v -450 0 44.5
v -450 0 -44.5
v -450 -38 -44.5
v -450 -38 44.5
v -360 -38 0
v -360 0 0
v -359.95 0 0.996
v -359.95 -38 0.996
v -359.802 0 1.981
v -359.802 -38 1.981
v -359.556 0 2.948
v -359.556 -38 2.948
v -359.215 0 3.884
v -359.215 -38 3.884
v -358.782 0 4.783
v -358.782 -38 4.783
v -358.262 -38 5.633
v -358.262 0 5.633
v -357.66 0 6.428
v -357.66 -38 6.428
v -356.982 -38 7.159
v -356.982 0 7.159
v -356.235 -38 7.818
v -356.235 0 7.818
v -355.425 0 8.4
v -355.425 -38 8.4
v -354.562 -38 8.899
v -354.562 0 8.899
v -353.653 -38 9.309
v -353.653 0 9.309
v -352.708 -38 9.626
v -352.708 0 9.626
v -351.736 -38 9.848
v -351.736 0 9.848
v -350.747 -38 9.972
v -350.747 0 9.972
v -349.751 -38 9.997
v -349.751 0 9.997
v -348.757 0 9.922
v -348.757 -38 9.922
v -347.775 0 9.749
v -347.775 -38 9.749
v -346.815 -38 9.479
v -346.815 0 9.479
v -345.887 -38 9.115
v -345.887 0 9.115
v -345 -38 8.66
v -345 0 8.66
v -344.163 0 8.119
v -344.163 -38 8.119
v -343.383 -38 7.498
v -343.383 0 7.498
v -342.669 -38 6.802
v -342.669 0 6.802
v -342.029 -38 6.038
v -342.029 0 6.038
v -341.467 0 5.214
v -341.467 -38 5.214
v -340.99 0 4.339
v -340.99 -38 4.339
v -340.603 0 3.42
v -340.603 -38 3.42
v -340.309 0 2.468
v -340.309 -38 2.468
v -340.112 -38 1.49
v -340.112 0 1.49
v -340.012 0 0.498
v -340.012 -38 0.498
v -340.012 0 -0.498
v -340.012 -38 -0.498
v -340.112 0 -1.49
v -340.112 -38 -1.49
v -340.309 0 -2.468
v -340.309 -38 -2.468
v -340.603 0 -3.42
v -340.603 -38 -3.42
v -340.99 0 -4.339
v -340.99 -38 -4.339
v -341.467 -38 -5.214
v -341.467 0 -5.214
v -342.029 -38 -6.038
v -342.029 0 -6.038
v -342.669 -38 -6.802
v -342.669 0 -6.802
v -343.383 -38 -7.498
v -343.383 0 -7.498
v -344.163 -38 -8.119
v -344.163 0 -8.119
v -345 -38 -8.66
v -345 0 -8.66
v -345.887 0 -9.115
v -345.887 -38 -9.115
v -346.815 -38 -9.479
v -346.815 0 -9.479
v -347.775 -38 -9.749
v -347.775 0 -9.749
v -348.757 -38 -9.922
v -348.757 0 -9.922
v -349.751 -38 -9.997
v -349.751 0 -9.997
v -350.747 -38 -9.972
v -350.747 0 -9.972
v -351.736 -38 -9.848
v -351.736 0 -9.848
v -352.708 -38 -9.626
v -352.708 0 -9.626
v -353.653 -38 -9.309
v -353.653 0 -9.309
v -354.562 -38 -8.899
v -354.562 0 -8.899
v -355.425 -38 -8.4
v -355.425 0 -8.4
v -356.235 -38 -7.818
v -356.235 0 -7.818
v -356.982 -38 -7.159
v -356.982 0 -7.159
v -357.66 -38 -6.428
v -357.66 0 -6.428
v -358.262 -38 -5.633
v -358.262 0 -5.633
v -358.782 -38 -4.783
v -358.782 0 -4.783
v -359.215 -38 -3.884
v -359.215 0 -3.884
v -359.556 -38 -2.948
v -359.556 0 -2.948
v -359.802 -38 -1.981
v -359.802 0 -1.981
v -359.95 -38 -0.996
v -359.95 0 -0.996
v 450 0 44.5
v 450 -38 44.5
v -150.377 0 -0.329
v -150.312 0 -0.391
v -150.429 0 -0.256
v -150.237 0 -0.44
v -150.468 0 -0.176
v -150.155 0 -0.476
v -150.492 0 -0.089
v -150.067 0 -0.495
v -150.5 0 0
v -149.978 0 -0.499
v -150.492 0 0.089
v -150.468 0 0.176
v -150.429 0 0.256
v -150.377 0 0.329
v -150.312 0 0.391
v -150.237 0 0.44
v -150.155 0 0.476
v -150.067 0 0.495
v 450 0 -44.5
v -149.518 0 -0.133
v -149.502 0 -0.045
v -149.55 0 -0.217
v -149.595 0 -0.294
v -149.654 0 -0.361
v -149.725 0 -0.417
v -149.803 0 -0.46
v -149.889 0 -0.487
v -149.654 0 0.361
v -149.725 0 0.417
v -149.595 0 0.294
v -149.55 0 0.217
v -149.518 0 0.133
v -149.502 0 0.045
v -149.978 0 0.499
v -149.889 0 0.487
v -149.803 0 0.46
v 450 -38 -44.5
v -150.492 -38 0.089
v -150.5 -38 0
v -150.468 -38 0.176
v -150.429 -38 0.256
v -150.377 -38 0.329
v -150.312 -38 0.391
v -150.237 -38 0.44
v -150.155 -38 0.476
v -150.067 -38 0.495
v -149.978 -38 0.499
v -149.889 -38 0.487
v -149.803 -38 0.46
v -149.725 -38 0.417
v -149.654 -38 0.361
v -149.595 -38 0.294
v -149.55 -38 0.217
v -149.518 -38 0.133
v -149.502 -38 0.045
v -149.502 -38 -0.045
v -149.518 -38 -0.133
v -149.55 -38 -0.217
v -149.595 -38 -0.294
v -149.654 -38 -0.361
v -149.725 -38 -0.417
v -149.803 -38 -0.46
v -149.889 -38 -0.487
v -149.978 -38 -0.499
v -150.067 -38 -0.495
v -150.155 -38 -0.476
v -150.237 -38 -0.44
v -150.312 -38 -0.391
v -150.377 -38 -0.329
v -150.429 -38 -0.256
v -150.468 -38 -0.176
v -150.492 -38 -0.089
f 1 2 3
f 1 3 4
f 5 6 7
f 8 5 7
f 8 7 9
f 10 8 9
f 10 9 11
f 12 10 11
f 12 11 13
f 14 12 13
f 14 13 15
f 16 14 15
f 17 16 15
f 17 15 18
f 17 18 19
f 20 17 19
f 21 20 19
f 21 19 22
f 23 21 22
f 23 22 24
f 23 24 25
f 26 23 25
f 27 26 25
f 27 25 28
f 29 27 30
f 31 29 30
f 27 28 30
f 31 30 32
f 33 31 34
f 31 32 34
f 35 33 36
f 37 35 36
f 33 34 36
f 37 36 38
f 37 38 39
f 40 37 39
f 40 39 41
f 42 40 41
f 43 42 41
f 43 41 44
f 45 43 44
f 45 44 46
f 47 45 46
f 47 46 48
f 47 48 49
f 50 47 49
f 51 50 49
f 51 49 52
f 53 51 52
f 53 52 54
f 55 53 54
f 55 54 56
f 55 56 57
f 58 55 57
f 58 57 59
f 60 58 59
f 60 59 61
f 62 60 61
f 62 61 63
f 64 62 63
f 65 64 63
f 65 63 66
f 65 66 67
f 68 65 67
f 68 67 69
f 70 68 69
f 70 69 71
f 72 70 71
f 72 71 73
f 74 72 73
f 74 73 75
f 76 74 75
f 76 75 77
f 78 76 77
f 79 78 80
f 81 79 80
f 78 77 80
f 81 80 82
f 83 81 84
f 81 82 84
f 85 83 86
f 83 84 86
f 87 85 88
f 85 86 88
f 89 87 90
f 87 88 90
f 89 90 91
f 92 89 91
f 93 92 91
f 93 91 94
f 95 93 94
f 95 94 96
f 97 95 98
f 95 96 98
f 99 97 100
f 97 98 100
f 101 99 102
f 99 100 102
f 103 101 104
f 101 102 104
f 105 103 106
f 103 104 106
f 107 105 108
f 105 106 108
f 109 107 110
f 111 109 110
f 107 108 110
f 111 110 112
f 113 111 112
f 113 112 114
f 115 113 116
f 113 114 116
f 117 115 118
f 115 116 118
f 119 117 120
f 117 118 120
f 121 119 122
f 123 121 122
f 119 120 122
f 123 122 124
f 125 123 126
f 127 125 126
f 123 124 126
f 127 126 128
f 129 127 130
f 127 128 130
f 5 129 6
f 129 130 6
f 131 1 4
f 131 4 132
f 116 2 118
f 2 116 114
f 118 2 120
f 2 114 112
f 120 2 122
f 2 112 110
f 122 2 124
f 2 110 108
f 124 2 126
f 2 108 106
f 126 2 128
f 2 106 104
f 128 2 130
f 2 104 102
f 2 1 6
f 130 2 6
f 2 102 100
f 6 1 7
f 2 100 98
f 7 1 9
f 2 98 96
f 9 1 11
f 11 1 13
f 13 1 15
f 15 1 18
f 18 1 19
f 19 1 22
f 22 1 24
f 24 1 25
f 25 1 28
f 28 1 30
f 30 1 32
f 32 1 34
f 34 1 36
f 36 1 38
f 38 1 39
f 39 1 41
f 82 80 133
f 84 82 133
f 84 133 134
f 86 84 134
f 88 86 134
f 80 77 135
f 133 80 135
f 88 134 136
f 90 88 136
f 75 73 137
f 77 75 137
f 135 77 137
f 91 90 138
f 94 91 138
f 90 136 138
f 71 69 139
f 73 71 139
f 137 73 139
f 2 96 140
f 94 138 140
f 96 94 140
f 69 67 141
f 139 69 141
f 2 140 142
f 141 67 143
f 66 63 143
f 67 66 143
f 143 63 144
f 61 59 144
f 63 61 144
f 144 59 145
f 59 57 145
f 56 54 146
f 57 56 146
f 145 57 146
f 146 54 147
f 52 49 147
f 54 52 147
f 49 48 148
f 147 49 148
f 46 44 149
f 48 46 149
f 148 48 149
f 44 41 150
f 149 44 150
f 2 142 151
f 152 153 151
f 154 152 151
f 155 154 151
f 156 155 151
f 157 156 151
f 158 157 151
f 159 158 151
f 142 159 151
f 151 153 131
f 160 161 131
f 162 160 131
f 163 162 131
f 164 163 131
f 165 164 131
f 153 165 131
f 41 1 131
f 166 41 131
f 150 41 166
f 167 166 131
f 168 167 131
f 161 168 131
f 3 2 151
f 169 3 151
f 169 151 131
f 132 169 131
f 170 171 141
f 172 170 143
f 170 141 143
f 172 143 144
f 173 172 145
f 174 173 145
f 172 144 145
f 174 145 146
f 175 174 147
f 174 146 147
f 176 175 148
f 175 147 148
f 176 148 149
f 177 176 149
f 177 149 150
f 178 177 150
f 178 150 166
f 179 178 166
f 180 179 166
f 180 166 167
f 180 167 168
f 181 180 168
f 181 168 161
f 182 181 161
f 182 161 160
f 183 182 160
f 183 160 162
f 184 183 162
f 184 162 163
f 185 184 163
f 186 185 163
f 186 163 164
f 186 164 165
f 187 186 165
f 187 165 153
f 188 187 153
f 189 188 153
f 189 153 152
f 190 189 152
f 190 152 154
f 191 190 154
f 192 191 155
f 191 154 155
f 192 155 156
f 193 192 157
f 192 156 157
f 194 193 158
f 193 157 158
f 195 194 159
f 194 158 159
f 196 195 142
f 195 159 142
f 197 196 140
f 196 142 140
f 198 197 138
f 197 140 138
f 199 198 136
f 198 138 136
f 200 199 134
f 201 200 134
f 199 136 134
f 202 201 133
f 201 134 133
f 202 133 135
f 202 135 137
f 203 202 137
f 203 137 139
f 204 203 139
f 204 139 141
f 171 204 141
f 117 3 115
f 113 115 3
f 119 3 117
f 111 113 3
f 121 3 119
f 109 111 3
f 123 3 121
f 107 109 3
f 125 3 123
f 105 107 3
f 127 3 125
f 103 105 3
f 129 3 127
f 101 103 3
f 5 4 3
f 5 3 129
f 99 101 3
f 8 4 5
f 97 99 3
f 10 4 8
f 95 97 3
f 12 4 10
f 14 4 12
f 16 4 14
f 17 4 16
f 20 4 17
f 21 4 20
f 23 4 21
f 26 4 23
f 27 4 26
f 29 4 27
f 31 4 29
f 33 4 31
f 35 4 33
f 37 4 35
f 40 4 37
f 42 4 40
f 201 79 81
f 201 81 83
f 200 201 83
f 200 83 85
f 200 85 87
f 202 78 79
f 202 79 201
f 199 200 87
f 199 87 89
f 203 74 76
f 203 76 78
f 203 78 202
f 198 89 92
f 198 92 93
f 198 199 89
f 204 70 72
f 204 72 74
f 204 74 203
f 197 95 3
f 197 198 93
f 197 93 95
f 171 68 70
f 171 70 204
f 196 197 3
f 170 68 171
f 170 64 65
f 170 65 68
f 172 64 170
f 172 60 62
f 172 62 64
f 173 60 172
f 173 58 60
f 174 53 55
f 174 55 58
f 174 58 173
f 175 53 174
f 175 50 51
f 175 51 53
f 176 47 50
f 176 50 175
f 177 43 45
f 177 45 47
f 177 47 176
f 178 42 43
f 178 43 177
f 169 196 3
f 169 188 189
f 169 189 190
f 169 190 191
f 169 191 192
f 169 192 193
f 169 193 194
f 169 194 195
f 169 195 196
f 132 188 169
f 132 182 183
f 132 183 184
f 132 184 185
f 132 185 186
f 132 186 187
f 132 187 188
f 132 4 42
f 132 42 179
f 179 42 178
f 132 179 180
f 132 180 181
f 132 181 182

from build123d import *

# Parameters (mm, degrees)
F0_W     = 900
F0_H     = 89
F1_DEPTH = 38
F3_D     = 20
F5_D     = 1


with BuildPart() as f1:
    # F0 (on Front) → F1 (new body)
    with BuildSketch(Plane.XZ):
        Rectangle(F0_W, F0_H)
    extrude(amount=F1_DEPTH)

    # F3 (through all)
    with Locations(Plane.XZ.offset(38)):
        with Locations((-350, 0)):
            Hole(F3_D / 2)

    # F5 (through all)
    with Locations(Plane.XZ.offset(38)):
        with Locations((-150, 0)):
            Hole(F5_D / 2)


solid = f1.part
